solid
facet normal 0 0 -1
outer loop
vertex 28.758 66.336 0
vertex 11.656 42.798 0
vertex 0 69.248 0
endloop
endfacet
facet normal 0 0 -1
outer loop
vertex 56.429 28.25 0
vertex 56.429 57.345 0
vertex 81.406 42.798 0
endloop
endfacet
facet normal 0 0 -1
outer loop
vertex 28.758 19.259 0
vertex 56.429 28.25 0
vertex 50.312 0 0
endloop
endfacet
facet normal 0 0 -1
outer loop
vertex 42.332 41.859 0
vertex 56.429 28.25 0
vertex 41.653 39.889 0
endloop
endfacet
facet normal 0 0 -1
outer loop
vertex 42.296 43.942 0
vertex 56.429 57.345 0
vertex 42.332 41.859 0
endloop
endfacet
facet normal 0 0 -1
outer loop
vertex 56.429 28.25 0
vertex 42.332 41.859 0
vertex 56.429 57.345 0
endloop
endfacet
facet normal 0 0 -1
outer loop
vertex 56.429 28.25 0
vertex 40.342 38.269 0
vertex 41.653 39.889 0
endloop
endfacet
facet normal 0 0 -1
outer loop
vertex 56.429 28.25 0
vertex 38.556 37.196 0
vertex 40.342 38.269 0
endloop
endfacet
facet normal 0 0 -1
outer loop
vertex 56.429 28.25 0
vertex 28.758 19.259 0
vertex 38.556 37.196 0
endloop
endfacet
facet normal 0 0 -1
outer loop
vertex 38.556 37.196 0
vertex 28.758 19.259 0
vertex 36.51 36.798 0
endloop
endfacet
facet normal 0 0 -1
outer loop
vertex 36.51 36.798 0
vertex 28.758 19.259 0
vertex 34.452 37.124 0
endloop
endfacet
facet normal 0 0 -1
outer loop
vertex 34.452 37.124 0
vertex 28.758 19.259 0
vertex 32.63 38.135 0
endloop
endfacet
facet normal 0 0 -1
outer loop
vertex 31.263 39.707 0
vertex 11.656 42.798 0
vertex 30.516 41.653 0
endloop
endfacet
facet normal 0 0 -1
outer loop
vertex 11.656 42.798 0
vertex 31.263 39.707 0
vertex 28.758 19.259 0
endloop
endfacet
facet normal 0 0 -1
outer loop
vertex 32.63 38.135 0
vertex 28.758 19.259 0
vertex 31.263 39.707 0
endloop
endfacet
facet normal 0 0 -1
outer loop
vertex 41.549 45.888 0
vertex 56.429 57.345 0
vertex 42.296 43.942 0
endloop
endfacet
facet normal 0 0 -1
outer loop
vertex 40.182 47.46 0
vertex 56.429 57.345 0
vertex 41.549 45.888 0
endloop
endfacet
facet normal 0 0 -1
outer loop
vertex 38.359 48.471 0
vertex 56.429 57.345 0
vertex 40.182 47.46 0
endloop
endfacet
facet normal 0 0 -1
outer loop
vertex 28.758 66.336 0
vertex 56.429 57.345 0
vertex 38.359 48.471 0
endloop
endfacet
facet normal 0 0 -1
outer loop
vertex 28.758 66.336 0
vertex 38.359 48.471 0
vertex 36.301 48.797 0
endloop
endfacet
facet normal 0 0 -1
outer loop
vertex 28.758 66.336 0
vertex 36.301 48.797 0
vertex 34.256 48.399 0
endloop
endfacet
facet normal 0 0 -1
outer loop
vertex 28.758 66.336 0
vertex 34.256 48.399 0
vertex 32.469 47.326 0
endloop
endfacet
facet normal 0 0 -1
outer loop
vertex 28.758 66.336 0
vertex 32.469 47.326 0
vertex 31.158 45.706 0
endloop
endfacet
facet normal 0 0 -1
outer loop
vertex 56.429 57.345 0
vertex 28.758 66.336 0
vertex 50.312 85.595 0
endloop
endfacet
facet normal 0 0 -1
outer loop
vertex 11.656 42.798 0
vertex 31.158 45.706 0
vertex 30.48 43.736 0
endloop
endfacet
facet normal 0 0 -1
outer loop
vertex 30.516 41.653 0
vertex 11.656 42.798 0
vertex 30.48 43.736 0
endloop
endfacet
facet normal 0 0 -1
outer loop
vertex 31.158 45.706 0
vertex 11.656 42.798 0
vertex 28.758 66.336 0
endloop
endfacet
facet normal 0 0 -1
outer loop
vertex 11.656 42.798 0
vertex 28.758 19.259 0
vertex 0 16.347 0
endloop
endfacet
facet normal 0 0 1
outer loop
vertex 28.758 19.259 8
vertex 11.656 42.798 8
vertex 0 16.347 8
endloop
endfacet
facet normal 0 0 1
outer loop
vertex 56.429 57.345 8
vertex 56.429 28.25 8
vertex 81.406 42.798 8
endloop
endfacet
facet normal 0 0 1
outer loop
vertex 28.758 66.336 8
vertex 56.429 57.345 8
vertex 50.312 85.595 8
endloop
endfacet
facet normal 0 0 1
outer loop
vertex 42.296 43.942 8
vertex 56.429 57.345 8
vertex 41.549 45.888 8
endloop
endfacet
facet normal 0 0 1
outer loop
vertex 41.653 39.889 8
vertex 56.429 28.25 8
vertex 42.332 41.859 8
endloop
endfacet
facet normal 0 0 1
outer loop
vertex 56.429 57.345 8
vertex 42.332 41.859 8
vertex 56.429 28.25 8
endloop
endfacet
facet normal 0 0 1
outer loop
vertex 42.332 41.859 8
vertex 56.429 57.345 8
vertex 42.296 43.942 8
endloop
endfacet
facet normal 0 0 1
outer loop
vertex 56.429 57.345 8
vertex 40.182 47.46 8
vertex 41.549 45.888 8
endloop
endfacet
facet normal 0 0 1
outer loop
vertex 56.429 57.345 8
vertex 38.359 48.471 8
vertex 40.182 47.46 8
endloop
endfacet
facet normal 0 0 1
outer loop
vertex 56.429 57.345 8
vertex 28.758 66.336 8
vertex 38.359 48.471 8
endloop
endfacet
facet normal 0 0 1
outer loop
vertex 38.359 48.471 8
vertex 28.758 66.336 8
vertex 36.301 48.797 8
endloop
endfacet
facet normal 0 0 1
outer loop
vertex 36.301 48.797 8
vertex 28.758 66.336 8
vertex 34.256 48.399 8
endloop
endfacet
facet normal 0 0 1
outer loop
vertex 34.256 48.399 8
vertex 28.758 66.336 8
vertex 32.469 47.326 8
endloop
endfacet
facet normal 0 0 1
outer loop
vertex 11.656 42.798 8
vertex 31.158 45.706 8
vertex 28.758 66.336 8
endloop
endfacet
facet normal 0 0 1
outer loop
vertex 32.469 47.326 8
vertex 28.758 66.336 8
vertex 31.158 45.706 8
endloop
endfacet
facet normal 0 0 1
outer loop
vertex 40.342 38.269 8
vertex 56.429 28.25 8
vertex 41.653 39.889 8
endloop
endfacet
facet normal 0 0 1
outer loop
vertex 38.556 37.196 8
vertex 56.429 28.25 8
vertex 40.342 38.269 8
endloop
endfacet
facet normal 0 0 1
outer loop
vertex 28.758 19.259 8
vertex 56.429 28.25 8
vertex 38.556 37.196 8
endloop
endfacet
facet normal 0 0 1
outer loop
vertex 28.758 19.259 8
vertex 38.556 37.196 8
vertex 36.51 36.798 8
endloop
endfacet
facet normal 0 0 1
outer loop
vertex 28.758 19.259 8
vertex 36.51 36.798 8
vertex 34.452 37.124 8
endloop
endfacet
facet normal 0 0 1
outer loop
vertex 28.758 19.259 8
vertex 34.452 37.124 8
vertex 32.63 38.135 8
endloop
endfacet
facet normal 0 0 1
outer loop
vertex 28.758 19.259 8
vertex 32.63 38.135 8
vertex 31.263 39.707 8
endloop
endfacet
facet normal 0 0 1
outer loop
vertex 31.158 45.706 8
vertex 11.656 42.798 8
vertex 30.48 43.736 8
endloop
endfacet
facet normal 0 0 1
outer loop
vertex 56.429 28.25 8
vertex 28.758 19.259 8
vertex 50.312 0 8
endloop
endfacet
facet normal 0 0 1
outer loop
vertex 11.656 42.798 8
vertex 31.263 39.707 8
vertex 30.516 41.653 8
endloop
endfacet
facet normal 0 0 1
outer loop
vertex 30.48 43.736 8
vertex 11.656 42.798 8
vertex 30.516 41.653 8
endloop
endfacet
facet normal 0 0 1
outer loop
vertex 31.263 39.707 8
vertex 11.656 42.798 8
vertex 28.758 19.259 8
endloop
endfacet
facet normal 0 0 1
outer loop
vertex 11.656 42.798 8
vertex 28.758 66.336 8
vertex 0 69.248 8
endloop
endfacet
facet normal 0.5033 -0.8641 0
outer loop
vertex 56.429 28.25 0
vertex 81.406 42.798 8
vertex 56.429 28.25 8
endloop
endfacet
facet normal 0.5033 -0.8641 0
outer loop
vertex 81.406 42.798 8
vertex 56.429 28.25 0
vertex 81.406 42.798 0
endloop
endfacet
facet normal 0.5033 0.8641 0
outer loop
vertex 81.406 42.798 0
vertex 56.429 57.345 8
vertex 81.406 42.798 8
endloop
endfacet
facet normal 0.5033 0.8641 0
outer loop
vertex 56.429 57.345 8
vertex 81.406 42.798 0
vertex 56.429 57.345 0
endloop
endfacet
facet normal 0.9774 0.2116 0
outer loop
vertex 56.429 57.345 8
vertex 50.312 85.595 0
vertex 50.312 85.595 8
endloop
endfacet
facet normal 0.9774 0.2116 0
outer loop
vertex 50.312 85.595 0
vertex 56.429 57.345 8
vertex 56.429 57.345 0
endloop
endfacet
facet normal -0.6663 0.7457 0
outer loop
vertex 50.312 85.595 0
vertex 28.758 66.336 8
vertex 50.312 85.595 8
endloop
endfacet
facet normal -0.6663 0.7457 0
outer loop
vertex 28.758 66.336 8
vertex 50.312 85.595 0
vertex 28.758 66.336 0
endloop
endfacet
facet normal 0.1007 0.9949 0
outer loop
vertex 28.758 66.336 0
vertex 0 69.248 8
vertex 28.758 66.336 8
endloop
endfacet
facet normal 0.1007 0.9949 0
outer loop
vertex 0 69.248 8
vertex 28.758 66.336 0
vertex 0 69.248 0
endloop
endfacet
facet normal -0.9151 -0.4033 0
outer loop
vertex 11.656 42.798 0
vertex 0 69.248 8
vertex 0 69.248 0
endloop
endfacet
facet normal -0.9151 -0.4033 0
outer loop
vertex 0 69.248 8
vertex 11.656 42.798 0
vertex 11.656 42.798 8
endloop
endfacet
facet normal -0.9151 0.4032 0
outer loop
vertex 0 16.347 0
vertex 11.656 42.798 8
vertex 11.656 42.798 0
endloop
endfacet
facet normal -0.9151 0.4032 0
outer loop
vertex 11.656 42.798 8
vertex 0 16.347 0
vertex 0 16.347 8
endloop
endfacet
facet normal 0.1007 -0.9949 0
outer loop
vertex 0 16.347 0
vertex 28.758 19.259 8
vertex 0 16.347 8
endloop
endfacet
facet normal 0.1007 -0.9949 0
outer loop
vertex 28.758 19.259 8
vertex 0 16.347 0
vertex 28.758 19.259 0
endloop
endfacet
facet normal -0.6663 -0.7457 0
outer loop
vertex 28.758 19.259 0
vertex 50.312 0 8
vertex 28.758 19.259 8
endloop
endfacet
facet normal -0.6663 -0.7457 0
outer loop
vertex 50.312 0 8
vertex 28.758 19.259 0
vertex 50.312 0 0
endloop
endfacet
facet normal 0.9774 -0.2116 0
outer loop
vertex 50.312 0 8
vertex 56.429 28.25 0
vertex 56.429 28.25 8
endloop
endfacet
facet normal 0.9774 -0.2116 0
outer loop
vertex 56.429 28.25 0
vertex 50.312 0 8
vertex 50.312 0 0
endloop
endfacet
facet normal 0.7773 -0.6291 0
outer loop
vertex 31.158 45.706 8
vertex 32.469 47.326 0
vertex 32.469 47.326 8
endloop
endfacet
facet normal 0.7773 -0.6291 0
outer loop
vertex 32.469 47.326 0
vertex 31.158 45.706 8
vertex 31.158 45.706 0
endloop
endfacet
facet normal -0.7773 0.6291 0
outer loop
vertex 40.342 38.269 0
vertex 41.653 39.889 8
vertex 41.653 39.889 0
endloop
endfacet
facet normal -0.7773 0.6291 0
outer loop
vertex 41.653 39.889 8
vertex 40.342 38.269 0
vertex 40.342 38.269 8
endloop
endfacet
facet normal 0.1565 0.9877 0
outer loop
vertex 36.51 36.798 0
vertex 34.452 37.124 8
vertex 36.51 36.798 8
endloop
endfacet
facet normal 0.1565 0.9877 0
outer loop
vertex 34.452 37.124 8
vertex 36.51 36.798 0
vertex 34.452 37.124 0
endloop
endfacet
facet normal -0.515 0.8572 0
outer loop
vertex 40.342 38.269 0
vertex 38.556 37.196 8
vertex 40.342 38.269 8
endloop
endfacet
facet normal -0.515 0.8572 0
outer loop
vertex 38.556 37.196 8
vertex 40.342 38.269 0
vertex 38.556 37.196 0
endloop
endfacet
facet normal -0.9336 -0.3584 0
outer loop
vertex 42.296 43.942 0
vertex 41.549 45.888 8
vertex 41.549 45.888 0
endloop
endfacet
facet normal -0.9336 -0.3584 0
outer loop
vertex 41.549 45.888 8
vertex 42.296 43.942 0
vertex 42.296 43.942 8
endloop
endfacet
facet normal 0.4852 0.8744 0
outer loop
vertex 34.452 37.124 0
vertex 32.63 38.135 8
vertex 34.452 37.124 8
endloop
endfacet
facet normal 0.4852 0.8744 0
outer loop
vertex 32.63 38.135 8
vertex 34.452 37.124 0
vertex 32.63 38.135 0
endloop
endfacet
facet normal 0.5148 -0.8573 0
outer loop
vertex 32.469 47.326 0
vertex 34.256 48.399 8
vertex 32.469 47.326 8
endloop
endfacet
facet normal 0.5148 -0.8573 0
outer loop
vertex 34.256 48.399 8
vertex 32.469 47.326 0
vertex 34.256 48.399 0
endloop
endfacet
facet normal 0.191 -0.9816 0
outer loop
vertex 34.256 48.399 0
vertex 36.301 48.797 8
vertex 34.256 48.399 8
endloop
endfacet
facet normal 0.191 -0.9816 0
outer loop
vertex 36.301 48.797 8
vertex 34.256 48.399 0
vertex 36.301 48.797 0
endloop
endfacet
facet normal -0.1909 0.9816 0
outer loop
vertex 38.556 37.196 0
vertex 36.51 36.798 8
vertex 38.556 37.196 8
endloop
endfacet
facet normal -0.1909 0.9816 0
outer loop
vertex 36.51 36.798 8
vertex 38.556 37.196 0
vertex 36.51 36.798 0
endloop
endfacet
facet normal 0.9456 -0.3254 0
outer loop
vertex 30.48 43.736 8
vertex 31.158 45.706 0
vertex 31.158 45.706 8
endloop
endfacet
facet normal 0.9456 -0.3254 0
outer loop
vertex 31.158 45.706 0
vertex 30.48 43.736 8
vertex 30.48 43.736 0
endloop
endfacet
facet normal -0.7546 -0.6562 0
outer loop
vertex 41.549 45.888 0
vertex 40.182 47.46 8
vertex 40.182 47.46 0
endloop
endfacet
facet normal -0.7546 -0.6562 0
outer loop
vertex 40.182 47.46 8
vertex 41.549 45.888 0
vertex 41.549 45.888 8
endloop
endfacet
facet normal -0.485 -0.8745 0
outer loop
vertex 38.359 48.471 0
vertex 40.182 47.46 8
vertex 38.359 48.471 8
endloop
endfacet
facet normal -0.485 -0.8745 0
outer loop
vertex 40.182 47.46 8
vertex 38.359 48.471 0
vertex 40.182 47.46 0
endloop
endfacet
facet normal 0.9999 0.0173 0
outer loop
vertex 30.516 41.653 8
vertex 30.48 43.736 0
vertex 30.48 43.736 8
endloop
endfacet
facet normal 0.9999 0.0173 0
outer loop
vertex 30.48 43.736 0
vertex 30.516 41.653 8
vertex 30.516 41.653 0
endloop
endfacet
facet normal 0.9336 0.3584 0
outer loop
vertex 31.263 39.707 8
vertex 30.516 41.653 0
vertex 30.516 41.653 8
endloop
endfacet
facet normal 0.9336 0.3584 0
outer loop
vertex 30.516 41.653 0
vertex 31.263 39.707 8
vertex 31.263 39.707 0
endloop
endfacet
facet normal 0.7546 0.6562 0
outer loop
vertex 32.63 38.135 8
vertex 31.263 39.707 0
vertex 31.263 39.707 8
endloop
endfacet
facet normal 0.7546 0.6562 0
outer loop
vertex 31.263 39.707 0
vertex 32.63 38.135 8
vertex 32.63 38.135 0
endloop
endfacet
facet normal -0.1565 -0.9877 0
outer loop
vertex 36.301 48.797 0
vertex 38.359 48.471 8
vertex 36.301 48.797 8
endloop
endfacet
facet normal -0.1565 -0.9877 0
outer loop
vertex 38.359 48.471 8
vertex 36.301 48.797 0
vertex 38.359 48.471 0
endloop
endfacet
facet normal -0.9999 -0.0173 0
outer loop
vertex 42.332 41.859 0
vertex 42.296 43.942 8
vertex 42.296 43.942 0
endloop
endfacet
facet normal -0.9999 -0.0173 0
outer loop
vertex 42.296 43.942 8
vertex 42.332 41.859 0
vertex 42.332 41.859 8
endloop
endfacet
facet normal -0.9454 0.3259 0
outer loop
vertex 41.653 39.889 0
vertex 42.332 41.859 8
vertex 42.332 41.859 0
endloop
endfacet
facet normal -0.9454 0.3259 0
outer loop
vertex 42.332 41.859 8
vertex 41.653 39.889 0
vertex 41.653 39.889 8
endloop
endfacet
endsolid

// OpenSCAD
$fn = 32;

// ----------------------------------------------------------------------
// Star wheel: 5-point star, R45
// ----------------------------------------------------------------------

// --- parameters (mm) ---
n_points = 5;             // number of points / teeth
r_out = 45;               // tip radius
r_in = 24.75;             // root radius
bore_r = 6;               // centre bore radius
plate_t = 8;              // plate thickness, Z (extrusion height)
bore_d = 12;              // centre bore diameter

profile = [[81.406, 42.798], [56.429, 57.345], [50.312, 85.595], [28.758, 66.336], [0, 69.248], [11.656, 42.798], [0, 16.347], [28.758, 19.259], [50.312, 0], [56.429, 28.25]];  // primary outline, 10 points, counter clockwise
void_1 = [[42.296, 43.942], [41.549, 45.888], [40.182, 47.46], [38.359, 48.471], [36.301, 48.797], [34.256, 48.399], [32.469, 47.326], [31.158, 45.706], [30.48, 43.736], [30.516, 41.653], [31.263, 39.707], [32.63, 38.135], [34.452, 37.124], [36.51, 36.798], [38.556, 37.196], [40.342, 38.269], [41.653, 39.889], [42.332, 41.859]];  // centre bore, 18 points

// --- the one profile operation ---
difference() {
  linear_extrude(height = plate_t) polygon(points = profile);
  translate([0, 0, -1])
    linear_extrude(height = plate_t + 2) polygon(points = void_1);
}
